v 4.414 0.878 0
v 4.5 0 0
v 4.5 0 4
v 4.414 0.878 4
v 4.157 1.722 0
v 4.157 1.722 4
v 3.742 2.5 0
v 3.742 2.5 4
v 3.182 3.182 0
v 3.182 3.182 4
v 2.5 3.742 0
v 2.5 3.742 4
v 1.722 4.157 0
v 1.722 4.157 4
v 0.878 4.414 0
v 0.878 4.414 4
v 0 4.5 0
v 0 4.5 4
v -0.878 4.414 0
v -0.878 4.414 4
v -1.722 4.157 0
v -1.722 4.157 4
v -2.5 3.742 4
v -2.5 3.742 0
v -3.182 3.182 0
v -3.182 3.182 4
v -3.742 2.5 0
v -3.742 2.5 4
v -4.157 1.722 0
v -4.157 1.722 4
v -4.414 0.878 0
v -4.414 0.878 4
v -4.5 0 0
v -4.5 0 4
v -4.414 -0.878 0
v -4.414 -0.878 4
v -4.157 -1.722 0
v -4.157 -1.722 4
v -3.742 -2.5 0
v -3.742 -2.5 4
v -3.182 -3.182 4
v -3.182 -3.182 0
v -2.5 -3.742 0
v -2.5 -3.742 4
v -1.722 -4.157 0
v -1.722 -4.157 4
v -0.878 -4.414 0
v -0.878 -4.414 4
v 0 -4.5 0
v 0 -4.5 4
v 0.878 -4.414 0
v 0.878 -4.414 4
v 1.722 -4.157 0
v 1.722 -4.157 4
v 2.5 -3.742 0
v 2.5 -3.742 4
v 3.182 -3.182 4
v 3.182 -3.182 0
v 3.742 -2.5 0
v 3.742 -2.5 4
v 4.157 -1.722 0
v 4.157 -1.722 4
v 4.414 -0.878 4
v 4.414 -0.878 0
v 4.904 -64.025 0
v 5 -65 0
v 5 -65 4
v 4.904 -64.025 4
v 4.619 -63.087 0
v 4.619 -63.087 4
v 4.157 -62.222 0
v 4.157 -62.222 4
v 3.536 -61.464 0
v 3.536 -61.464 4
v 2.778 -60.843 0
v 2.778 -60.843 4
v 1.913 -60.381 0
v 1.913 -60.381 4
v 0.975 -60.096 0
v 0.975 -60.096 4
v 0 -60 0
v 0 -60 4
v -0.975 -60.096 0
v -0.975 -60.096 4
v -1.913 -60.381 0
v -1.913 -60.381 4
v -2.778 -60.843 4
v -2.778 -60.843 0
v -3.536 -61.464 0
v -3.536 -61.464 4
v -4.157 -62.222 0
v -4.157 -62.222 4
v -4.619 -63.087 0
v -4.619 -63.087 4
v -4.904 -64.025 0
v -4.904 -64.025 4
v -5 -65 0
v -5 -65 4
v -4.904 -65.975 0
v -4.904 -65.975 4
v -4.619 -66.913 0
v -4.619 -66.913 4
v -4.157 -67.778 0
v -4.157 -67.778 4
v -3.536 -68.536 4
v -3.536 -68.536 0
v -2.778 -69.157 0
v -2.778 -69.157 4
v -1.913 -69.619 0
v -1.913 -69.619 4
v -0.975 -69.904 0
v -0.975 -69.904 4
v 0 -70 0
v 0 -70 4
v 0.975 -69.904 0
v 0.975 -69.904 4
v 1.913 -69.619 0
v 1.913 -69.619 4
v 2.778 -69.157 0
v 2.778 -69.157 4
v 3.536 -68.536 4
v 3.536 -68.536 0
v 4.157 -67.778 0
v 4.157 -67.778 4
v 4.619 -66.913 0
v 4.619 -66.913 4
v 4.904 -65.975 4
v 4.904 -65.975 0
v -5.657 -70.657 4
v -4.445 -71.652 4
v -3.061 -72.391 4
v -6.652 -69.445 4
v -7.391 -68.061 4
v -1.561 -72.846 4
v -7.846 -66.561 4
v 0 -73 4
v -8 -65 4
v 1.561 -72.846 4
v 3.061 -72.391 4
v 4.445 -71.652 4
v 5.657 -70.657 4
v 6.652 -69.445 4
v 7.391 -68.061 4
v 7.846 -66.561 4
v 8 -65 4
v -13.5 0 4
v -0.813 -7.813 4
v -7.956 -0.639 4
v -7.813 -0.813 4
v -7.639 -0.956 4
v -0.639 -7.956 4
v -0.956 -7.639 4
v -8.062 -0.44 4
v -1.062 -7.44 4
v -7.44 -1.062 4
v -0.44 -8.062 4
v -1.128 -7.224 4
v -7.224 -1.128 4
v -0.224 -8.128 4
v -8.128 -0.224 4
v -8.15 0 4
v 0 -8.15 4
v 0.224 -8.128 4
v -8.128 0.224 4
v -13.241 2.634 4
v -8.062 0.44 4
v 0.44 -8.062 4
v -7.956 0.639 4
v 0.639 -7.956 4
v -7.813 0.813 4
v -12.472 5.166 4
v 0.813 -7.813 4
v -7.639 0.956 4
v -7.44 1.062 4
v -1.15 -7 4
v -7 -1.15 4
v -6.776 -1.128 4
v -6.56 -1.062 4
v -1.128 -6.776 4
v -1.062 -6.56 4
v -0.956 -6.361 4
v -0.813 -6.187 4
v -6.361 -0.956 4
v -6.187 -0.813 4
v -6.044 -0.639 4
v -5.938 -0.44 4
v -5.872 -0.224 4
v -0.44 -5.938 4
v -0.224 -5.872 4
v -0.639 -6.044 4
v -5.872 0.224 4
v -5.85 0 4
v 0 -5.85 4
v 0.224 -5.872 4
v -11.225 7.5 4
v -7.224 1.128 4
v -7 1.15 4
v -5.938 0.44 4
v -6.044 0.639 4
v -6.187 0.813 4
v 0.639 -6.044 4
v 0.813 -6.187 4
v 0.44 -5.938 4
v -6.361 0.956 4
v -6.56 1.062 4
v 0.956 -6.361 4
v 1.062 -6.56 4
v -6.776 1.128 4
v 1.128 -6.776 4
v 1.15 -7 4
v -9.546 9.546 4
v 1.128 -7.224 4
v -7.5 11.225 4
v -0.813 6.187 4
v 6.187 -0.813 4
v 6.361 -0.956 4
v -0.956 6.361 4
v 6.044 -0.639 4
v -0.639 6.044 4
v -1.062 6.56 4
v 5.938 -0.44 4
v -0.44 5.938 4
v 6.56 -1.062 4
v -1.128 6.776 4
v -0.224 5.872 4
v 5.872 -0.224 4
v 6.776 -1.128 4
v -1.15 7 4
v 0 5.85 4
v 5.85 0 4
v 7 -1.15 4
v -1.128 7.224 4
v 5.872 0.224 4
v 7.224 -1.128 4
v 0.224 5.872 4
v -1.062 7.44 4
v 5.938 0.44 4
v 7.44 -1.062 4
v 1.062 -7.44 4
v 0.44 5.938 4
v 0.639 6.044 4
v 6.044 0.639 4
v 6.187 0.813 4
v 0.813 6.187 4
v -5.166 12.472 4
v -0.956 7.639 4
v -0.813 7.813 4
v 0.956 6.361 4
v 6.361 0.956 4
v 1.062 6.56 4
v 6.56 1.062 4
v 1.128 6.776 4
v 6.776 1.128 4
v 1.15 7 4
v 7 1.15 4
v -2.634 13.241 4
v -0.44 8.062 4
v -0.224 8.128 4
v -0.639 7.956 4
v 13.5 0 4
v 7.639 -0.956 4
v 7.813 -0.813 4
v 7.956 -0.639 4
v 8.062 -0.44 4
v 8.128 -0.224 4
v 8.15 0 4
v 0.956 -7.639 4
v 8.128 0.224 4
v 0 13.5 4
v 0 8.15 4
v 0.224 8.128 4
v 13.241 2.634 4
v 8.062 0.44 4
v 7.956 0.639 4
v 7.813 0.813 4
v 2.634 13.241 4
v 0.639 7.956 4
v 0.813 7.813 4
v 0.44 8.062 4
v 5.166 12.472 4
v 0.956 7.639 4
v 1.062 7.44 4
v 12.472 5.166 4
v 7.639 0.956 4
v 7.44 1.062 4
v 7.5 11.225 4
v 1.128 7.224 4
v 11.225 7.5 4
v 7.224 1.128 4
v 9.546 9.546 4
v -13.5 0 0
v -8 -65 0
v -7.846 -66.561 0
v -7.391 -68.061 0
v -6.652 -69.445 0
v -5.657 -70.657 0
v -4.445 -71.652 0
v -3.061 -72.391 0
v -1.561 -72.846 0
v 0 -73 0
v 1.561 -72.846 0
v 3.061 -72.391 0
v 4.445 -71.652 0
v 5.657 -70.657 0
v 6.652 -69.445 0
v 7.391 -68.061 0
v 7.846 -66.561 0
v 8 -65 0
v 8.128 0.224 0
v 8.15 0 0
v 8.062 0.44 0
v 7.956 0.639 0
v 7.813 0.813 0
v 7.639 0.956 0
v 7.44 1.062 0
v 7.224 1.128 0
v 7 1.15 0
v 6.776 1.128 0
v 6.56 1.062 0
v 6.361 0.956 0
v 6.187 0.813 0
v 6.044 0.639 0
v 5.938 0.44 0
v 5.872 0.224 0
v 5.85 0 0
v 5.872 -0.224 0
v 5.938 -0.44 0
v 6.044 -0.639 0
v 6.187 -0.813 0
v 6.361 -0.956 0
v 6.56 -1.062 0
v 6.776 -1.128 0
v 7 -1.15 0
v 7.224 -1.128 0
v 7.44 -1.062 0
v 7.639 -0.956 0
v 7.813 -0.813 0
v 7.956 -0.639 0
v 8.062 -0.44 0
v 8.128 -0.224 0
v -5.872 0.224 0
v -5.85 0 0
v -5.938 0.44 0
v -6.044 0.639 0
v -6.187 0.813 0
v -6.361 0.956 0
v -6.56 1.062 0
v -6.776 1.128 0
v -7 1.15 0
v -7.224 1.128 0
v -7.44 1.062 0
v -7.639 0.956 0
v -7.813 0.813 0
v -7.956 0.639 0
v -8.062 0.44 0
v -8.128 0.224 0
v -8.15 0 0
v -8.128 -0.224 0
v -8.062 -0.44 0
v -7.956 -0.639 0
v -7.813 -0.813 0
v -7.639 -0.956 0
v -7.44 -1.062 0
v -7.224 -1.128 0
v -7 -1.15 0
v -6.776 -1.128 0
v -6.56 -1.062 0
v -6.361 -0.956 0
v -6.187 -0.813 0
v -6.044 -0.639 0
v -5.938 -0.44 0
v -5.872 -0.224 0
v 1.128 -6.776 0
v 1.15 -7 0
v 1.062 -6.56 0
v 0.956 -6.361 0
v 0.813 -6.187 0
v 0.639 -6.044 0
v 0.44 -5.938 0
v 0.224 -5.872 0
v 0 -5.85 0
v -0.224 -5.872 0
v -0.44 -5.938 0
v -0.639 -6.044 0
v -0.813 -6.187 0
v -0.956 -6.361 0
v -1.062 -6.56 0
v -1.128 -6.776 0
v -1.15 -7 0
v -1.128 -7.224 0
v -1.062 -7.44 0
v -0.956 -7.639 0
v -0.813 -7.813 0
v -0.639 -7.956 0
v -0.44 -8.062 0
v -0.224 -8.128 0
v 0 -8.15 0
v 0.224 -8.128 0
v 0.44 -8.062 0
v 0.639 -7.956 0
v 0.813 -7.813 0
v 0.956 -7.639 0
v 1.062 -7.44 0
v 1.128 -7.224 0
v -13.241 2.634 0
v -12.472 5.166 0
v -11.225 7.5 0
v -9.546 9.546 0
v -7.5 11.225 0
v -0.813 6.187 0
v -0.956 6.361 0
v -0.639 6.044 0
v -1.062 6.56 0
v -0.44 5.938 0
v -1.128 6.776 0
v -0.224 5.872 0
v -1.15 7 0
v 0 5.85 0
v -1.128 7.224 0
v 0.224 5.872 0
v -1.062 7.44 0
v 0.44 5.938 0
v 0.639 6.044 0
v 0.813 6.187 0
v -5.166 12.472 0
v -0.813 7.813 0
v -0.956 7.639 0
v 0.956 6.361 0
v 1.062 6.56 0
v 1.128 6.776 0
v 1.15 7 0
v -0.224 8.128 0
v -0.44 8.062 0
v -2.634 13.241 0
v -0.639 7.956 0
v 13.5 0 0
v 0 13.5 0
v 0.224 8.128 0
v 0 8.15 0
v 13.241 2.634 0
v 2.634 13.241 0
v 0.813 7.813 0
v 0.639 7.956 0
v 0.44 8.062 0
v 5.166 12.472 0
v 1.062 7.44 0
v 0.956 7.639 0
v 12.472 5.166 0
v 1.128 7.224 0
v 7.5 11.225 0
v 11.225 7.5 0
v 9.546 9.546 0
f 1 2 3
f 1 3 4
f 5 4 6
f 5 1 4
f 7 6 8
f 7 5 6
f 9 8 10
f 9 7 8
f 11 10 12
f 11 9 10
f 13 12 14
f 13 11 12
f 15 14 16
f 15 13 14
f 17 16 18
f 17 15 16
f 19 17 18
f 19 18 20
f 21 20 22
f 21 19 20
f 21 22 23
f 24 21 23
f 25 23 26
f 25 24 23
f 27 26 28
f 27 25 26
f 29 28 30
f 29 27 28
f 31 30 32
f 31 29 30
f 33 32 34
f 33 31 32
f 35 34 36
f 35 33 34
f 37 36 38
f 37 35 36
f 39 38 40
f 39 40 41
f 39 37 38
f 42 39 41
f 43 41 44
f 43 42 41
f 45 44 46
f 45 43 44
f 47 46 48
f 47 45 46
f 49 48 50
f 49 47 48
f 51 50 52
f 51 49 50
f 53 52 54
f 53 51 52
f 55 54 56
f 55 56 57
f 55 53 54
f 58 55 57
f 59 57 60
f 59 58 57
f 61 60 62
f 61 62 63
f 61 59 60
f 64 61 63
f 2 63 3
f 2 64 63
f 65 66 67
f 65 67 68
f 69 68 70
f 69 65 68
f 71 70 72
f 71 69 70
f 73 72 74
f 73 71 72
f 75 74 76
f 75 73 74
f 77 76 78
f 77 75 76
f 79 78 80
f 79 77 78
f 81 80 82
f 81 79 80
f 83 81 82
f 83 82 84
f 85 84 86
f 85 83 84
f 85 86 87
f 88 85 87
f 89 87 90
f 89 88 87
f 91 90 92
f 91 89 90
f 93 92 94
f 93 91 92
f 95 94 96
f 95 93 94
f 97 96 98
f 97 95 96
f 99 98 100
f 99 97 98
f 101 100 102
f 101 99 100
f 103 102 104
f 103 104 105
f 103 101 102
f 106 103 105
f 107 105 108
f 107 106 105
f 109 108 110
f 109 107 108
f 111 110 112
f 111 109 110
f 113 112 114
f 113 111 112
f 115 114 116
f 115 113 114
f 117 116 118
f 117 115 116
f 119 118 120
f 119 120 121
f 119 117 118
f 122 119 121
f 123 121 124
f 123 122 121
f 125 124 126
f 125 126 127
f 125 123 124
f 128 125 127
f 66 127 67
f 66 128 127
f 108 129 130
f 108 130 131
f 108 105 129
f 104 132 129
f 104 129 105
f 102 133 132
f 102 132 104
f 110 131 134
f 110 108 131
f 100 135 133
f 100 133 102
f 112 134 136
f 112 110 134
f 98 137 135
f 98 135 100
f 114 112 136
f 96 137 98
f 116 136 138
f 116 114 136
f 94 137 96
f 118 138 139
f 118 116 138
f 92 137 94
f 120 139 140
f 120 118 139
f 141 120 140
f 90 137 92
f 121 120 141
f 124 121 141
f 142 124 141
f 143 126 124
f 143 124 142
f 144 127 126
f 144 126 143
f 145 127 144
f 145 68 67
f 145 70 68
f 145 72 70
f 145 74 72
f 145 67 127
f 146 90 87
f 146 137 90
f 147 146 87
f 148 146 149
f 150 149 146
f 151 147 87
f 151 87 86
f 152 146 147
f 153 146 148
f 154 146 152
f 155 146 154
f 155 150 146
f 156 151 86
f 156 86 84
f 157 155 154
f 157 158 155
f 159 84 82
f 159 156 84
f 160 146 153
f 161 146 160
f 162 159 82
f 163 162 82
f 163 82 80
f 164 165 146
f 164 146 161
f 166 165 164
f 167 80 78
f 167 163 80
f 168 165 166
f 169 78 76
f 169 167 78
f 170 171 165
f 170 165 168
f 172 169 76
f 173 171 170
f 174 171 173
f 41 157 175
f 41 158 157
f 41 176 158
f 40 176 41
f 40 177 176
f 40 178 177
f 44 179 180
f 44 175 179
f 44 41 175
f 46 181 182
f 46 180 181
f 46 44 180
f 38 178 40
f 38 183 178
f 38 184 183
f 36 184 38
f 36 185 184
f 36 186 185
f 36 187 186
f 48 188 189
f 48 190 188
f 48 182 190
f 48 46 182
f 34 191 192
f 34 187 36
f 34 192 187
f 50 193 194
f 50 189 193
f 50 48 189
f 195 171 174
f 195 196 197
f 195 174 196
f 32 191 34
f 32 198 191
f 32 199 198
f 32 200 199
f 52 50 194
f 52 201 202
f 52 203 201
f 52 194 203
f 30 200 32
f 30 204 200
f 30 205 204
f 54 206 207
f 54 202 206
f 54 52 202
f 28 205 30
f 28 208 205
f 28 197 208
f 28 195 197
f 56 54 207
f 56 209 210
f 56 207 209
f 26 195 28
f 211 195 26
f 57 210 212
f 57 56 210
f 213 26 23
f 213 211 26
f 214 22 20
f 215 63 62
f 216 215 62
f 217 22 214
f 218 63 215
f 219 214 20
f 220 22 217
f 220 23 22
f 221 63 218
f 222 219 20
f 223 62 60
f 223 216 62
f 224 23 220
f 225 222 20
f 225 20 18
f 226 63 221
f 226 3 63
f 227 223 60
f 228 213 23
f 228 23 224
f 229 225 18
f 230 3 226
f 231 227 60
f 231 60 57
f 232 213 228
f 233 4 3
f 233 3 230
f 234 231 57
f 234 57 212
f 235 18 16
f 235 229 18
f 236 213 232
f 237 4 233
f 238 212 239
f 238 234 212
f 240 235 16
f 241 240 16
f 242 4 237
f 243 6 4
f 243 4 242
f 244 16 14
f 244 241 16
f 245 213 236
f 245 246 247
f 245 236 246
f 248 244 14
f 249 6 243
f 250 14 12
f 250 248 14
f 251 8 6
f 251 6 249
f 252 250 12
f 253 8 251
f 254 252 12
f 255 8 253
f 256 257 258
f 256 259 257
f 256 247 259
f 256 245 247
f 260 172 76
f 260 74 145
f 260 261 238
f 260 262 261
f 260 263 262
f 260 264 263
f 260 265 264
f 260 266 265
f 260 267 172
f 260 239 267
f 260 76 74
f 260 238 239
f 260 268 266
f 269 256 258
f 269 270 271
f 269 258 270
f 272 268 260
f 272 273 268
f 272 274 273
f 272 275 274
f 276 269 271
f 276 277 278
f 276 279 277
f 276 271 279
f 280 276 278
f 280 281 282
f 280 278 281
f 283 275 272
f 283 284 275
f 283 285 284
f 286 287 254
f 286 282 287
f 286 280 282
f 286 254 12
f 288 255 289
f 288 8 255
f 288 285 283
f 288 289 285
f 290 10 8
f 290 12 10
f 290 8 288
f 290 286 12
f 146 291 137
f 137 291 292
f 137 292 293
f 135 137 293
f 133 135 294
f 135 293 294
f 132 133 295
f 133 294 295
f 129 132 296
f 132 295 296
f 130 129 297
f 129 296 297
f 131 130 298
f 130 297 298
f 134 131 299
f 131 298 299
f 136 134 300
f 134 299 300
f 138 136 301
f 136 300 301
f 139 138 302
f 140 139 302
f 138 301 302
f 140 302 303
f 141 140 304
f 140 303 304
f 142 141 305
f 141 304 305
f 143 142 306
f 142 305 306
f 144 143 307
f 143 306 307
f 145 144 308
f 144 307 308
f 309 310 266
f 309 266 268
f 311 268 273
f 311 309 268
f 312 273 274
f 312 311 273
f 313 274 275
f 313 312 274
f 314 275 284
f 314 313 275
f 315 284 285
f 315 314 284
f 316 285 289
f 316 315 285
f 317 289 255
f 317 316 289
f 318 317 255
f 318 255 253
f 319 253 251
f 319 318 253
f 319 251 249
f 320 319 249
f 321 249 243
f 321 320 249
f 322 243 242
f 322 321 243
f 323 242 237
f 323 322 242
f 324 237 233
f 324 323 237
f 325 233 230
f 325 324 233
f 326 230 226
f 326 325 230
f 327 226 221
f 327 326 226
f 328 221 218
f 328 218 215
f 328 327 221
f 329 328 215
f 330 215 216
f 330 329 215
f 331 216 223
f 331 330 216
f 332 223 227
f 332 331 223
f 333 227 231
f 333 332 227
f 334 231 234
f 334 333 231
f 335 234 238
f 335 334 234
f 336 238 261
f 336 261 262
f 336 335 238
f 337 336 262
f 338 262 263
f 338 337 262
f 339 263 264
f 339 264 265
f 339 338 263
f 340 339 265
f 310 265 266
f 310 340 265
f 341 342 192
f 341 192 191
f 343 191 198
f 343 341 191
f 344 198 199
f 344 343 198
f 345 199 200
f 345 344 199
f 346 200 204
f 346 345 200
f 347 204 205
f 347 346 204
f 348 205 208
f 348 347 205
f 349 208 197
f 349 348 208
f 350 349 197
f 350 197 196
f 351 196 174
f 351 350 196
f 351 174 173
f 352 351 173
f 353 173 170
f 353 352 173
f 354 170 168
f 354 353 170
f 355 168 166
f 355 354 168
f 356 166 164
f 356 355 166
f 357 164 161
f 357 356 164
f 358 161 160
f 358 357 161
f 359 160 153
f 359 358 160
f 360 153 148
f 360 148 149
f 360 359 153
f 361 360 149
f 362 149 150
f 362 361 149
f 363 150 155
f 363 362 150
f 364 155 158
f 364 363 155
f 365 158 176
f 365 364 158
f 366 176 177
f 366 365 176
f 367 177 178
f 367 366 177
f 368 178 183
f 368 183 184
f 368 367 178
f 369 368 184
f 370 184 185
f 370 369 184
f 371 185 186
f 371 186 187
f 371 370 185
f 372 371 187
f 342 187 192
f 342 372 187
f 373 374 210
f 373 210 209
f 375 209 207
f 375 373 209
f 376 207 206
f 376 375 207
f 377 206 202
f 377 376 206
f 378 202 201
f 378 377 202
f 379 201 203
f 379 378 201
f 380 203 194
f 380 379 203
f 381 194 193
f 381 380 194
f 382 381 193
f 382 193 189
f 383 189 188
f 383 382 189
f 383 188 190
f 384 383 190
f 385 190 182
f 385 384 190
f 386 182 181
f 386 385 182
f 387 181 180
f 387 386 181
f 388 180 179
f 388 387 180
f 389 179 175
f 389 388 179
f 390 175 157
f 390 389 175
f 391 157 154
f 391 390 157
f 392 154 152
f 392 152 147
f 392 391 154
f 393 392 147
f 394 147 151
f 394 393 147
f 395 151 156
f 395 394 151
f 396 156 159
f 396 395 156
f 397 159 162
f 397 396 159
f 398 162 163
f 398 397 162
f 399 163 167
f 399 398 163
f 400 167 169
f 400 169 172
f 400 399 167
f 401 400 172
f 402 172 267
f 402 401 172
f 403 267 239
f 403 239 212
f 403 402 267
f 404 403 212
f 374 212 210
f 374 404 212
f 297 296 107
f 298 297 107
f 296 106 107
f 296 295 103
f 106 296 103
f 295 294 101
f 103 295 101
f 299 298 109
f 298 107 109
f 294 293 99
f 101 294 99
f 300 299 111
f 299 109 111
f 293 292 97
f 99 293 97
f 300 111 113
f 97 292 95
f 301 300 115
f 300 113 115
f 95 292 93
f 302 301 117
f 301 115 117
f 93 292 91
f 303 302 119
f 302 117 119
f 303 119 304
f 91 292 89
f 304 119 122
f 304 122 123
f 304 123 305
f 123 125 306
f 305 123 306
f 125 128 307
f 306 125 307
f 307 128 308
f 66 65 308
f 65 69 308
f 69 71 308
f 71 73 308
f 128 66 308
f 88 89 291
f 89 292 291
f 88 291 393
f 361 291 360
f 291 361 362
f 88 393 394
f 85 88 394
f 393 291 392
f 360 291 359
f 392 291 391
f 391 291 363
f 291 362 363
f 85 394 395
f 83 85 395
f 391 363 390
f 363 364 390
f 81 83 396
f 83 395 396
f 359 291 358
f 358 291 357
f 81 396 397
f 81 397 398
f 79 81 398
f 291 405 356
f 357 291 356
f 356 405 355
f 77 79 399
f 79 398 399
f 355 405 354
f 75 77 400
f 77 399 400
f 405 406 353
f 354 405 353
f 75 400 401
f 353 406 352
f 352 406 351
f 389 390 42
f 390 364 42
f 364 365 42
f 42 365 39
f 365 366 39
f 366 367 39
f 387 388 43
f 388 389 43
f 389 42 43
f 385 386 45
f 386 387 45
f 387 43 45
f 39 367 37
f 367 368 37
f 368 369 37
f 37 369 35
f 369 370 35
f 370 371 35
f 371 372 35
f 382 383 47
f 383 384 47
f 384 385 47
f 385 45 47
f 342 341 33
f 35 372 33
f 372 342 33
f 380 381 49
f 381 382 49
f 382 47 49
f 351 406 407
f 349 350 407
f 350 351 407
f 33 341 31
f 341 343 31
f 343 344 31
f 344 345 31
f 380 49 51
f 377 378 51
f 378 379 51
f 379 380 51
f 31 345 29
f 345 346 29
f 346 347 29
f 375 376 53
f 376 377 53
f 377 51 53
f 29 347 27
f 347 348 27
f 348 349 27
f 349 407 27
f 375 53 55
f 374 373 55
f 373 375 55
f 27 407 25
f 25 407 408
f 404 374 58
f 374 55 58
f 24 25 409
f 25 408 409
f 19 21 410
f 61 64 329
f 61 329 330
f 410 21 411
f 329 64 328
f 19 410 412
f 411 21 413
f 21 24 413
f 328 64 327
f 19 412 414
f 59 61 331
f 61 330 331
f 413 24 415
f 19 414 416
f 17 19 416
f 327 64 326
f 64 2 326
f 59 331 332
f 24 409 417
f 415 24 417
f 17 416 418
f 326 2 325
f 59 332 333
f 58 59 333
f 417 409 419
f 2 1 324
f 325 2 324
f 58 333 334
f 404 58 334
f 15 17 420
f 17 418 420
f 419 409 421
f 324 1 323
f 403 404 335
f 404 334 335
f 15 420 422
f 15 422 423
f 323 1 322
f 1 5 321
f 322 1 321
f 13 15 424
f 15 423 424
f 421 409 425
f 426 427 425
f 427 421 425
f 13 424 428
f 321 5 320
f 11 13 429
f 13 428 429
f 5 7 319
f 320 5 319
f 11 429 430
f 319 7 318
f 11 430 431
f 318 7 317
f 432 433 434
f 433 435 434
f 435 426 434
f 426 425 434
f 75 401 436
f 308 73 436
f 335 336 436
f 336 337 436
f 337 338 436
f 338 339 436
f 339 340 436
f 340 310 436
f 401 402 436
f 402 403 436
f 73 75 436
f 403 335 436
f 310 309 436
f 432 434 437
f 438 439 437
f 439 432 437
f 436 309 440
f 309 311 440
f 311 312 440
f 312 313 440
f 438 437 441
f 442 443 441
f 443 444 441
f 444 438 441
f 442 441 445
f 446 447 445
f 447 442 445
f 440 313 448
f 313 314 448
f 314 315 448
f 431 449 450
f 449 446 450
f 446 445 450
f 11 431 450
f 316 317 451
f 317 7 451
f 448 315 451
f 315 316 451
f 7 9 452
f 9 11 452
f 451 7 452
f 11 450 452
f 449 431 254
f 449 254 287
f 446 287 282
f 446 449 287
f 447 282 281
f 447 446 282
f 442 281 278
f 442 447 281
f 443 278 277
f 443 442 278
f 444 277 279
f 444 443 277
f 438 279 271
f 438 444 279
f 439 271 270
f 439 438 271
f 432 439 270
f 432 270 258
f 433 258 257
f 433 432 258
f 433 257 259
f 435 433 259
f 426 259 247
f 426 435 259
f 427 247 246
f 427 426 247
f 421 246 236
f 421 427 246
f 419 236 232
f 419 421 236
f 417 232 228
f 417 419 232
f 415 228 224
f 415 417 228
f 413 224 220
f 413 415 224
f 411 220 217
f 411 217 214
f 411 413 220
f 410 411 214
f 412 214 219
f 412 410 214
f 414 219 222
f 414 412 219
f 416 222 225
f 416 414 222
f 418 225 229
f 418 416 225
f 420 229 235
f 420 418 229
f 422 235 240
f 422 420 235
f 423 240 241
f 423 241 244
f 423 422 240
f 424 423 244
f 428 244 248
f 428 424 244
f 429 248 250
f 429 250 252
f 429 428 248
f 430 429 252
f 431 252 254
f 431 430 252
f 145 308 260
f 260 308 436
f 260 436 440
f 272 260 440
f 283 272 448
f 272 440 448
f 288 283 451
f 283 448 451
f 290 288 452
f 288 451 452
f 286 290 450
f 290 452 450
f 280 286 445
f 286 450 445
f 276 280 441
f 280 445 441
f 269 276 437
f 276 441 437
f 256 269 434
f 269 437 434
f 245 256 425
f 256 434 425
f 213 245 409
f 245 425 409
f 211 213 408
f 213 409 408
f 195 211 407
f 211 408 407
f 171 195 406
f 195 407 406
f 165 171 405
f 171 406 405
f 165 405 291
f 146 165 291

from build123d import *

# Parameters (mm, degrees)
SKETCH_1_R      = 4.5
SKETCH_1_R_2    = 1.15
SKETCH_1_R_3    = 5
EXTRUDE_1_DEPTH = 4


with BuildPart() as part:
    # 草图1 → 凸台-拉伸1 (new body)
    with BuildSketch(Plane.XY):
        with BuildLine():
            Line((-13.5, 0), (-8, -65))
            ThreePointArc((-8, -65), (0, -73), (8, -65))
            Line((8, -65), (13.5, 0))
            ThreePointArc((13.5, 0), (0, 13.5), (-13.5, 0))
        make_face()
        Circle(SKETCH_1_R, mode=Mode.SUBTRACT)
        with Locations((0, 7)):
            Circle(SKETCH_1_R_2, mode=Mode.SUBTRACT)
        with Locations((7, 0)):
            Circle(SKETCH_1_R_2, mode=Mode.SUBTRACT)
        with Locations((0, -7)):
            Circle(SKETCH_1_R_2, mode=Mode.SUBTRACT)
        with Locations((-7, 0)):
            Circle(SKETCH_1_R_2, mode=Mode.SUBTRACT)
        with Locations((0, -65)):
            Circle(SKETCH_1_R_3, mode=Mode.SUBTRACT)
    extrude(amount=EXTRUDE_1_DEPTH)


solid = part.part
